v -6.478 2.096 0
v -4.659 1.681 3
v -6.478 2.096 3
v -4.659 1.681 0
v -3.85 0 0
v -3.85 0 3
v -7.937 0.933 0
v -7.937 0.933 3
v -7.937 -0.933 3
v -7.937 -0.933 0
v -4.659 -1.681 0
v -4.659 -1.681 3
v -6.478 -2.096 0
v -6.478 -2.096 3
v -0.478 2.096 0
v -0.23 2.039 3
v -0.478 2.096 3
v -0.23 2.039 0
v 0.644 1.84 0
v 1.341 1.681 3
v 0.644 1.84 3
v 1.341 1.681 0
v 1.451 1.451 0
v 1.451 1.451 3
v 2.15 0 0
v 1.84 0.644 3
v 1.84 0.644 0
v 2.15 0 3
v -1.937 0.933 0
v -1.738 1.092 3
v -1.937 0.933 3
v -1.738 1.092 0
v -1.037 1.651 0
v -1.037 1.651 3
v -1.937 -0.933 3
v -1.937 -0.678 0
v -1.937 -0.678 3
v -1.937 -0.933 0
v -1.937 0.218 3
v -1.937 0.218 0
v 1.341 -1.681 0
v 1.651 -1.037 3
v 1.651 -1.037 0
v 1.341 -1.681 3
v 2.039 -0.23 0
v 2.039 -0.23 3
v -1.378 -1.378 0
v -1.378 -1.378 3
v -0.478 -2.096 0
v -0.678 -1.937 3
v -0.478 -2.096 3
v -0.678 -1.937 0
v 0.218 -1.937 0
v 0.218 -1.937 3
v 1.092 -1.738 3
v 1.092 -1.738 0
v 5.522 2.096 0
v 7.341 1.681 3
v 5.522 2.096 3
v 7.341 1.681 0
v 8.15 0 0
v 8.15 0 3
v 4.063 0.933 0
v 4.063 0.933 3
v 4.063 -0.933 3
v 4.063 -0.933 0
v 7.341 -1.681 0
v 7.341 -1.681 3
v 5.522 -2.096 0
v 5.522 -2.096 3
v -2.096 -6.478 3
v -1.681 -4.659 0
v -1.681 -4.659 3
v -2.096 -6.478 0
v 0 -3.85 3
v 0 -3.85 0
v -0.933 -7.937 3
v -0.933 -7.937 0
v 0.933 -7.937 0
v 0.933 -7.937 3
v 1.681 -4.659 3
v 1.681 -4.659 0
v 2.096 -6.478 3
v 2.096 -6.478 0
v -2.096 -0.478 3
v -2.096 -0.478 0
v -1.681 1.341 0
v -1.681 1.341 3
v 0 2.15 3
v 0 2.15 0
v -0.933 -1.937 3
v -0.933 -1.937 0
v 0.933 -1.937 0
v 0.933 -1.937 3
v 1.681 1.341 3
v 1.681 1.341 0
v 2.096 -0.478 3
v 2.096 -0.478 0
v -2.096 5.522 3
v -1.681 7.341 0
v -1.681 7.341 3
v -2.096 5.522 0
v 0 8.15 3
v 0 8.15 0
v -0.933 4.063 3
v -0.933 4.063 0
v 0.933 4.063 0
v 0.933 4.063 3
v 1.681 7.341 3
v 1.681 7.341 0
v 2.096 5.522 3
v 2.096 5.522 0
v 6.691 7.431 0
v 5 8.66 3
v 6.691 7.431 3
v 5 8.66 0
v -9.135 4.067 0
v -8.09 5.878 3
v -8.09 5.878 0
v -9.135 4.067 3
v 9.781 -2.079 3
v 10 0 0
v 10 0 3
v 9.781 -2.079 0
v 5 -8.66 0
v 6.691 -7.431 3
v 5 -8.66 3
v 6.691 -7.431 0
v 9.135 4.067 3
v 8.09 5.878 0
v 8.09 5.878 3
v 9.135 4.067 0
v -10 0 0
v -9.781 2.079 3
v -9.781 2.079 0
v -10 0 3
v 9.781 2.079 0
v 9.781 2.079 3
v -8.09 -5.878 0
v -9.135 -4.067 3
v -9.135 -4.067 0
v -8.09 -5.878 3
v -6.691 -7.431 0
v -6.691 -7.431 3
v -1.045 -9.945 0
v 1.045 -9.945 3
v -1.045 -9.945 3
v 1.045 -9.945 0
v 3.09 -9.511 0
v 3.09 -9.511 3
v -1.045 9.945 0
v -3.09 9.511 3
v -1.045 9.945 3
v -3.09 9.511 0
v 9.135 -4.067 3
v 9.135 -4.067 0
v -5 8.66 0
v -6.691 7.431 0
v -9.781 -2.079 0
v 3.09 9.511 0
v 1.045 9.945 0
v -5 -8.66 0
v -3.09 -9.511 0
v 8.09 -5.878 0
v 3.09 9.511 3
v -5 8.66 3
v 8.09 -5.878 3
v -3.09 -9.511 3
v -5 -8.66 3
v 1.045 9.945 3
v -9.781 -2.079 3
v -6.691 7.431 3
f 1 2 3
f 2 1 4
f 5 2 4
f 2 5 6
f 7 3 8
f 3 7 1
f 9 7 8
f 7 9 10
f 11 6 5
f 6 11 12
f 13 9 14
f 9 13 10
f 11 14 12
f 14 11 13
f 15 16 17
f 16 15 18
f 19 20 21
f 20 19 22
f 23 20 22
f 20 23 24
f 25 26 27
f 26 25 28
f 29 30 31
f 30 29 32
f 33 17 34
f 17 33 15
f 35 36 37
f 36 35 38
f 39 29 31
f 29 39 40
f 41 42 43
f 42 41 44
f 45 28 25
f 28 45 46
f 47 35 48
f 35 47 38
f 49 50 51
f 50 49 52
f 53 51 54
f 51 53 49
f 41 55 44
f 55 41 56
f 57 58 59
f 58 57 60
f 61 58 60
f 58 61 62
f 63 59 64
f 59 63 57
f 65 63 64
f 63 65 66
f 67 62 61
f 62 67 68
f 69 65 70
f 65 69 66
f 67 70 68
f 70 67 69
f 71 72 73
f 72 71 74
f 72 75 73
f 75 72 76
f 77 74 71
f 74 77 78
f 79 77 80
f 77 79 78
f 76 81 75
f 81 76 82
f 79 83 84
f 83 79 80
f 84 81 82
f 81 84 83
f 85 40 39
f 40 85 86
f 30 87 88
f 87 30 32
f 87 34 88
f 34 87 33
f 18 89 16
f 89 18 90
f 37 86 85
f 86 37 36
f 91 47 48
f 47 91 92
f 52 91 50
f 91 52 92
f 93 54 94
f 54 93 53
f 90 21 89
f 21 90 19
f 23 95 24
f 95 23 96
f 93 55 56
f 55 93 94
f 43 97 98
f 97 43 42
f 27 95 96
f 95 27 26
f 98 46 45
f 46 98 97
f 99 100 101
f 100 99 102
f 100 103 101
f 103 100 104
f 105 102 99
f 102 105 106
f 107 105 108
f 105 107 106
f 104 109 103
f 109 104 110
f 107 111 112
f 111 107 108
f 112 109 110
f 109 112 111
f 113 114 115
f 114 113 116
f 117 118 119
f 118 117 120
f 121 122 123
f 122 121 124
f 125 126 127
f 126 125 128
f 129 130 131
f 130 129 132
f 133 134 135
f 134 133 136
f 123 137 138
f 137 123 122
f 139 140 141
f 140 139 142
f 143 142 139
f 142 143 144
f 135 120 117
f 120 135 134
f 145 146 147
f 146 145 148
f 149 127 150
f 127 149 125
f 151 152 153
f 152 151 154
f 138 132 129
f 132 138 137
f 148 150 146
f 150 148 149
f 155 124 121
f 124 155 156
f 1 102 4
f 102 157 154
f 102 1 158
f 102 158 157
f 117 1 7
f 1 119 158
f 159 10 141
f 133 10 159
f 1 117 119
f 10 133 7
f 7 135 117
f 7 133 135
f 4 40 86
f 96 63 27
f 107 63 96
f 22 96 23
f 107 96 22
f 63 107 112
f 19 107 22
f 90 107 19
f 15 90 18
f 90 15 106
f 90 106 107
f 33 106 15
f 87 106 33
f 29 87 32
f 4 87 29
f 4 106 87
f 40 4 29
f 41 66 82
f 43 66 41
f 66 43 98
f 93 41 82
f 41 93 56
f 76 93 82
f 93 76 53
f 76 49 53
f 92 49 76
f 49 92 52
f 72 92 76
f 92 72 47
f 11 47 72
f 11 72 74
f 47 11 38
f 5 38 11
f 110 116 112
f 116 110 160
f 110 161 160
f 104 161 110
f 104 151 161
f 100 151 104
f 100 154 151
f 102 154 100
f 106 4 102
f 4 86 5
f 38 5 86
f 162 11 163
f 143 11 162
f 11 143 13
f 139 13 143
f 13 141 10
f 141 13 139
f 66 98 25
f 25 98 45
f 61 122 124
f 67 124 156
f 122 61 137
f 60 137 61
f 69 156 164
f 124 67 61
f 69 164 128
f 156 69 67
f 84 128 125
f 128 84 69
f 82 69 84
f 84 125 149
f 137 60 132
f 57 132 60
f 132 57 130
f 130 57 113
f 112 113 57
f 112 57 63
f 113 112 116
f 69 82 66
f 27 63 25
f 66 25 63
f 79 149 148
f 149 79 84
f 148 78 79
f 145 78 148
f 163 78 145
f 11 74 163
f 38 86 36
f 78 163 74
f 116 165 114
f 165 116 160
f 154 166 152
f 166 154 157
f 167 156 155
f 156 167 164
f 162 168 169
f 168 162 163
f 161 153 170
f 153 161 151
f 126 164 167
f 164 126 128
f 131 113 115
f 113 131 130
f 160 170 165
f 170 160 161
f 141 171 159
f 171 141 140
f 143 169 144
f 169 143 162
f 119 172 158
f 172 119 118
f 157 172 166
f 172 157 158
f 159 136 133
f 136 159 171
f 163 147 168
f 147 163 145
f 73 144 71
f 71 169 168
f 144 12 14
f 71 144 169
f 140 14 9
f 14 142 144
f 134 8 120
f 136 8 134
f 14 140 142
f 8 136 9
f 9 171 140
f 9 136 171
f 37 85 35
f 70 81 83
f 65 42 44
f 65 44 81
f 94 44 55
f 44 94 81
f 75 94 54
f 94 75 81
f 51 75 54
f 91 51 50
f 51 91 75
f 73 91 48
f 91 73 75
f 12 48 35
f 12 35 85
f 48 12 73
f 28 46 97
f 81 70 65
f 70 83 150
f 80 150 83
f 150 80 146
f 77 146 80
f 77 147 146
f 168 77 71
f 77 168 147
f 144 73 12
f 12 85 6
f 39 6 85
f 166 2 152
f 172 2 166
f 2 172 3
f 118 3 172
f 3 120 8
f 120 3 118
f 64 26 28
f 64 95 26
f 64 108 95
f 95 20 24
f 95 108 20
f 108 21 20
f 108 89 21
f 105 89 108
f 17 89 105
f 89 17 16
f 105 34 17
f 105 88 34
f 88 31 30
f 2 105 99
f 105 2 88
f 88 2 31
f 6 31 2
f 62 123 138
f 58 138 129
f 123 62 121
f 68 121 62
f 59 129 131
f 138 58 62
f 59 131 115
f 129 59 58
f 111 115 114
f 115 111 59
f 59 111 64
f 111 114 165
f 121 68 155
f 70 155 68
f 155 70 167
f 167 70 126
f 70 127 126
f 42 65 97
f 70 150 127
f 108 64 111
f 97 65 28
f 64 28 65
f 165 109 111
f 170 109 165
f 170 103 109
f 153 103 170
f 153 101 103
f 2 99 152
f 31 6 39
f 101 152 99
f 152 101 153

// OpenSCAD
// file: ollo.scad
// Diameter of plastic ollo holes
OlloHoles = 4.3;

// Width of Ollo "real" plastic
OlloWidth = 3;

// Distance between two ollo holes
OlloSpacing = 6;

// Do an Ollo hole on the part
module olloHole(depth=2.2)
{
    translate([0,0,-0.1])
      cylinder(depth+0.2, OlloHoles/2, OlloHoles/2);
}

// Do 3 ollo holes
module threeOllo(depth=2.2)
{
  for (xy=[[-OlloSpacing,0],[0,0],[OlloSpacing,0]]) {
    translate([xy[0], xy[1], 0])
    olloHole(depth);
  }
}

// Do a servo arm holes
module servoArm(depth=2.2)
{
    threeOllo(depth);
    rotate([0,0,90])
    threeOllo(depth);
}
// main file
include <ollo.scad>;

module arm() {
    color([0.6,0.6,0.6]) {
        difference() {
            cylinder(r=10, h=OlloWidth);
            servoArm(OlloWidth);
        }
    }
}

arm();
